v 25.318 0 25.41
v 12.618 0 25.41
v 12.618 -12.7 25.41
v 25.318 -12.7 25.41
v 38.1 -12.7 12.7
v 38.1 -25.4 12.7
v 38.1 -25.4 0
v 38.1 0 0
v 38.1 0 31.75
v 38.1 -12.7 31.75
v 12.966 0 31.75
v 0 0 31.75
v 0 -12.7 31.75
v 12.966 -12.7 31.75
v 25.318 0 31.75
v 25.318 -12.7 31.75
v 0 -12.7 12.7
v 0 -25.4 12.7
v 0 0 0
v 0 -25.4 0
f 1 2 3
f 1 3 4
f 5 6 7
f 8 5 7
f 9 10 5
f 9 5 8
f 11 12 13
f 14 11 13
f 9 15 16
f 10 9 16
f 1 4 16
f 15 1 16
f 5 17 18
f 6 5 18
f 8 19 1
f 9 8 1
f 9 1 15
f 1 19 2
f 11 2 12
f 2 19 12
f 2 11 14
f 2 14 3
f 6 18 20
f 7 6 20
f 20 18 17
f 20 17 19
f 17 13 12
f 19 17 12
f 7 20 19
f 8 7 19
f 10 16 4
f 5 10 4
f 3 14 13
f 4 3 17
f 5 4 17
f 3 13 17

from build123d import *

# Parameters (mm, degrees)
F1_DEPTH = 38.1
F3_DEPTH = 12.701


with BuildPart() as f1:
    # F0 (on Right) → F1 (new body)
    with BuildSketch(Plane.YZ):
        Polygon((0, 0), (0, 31.75), (-12.7, 31.75), (-12.7, 12.7), (-25.4, 12.7), (-25.4, 0), align=None)
    extrude(amount=F1_DEPTH)

    # F2 (on face) → F3 (cut, through all)
    with BuildSketch(Plane.XZ.offset(12.7)):
        Polygon((25.318417, 31.75), (12.966445, 31.75), (12.618417, 25.409544), (25.318417, 25.409544), align=None)
    extrude(amount=-F3_DEPTH, mode=Mode.SUBTRACT)


solid = f1.part
